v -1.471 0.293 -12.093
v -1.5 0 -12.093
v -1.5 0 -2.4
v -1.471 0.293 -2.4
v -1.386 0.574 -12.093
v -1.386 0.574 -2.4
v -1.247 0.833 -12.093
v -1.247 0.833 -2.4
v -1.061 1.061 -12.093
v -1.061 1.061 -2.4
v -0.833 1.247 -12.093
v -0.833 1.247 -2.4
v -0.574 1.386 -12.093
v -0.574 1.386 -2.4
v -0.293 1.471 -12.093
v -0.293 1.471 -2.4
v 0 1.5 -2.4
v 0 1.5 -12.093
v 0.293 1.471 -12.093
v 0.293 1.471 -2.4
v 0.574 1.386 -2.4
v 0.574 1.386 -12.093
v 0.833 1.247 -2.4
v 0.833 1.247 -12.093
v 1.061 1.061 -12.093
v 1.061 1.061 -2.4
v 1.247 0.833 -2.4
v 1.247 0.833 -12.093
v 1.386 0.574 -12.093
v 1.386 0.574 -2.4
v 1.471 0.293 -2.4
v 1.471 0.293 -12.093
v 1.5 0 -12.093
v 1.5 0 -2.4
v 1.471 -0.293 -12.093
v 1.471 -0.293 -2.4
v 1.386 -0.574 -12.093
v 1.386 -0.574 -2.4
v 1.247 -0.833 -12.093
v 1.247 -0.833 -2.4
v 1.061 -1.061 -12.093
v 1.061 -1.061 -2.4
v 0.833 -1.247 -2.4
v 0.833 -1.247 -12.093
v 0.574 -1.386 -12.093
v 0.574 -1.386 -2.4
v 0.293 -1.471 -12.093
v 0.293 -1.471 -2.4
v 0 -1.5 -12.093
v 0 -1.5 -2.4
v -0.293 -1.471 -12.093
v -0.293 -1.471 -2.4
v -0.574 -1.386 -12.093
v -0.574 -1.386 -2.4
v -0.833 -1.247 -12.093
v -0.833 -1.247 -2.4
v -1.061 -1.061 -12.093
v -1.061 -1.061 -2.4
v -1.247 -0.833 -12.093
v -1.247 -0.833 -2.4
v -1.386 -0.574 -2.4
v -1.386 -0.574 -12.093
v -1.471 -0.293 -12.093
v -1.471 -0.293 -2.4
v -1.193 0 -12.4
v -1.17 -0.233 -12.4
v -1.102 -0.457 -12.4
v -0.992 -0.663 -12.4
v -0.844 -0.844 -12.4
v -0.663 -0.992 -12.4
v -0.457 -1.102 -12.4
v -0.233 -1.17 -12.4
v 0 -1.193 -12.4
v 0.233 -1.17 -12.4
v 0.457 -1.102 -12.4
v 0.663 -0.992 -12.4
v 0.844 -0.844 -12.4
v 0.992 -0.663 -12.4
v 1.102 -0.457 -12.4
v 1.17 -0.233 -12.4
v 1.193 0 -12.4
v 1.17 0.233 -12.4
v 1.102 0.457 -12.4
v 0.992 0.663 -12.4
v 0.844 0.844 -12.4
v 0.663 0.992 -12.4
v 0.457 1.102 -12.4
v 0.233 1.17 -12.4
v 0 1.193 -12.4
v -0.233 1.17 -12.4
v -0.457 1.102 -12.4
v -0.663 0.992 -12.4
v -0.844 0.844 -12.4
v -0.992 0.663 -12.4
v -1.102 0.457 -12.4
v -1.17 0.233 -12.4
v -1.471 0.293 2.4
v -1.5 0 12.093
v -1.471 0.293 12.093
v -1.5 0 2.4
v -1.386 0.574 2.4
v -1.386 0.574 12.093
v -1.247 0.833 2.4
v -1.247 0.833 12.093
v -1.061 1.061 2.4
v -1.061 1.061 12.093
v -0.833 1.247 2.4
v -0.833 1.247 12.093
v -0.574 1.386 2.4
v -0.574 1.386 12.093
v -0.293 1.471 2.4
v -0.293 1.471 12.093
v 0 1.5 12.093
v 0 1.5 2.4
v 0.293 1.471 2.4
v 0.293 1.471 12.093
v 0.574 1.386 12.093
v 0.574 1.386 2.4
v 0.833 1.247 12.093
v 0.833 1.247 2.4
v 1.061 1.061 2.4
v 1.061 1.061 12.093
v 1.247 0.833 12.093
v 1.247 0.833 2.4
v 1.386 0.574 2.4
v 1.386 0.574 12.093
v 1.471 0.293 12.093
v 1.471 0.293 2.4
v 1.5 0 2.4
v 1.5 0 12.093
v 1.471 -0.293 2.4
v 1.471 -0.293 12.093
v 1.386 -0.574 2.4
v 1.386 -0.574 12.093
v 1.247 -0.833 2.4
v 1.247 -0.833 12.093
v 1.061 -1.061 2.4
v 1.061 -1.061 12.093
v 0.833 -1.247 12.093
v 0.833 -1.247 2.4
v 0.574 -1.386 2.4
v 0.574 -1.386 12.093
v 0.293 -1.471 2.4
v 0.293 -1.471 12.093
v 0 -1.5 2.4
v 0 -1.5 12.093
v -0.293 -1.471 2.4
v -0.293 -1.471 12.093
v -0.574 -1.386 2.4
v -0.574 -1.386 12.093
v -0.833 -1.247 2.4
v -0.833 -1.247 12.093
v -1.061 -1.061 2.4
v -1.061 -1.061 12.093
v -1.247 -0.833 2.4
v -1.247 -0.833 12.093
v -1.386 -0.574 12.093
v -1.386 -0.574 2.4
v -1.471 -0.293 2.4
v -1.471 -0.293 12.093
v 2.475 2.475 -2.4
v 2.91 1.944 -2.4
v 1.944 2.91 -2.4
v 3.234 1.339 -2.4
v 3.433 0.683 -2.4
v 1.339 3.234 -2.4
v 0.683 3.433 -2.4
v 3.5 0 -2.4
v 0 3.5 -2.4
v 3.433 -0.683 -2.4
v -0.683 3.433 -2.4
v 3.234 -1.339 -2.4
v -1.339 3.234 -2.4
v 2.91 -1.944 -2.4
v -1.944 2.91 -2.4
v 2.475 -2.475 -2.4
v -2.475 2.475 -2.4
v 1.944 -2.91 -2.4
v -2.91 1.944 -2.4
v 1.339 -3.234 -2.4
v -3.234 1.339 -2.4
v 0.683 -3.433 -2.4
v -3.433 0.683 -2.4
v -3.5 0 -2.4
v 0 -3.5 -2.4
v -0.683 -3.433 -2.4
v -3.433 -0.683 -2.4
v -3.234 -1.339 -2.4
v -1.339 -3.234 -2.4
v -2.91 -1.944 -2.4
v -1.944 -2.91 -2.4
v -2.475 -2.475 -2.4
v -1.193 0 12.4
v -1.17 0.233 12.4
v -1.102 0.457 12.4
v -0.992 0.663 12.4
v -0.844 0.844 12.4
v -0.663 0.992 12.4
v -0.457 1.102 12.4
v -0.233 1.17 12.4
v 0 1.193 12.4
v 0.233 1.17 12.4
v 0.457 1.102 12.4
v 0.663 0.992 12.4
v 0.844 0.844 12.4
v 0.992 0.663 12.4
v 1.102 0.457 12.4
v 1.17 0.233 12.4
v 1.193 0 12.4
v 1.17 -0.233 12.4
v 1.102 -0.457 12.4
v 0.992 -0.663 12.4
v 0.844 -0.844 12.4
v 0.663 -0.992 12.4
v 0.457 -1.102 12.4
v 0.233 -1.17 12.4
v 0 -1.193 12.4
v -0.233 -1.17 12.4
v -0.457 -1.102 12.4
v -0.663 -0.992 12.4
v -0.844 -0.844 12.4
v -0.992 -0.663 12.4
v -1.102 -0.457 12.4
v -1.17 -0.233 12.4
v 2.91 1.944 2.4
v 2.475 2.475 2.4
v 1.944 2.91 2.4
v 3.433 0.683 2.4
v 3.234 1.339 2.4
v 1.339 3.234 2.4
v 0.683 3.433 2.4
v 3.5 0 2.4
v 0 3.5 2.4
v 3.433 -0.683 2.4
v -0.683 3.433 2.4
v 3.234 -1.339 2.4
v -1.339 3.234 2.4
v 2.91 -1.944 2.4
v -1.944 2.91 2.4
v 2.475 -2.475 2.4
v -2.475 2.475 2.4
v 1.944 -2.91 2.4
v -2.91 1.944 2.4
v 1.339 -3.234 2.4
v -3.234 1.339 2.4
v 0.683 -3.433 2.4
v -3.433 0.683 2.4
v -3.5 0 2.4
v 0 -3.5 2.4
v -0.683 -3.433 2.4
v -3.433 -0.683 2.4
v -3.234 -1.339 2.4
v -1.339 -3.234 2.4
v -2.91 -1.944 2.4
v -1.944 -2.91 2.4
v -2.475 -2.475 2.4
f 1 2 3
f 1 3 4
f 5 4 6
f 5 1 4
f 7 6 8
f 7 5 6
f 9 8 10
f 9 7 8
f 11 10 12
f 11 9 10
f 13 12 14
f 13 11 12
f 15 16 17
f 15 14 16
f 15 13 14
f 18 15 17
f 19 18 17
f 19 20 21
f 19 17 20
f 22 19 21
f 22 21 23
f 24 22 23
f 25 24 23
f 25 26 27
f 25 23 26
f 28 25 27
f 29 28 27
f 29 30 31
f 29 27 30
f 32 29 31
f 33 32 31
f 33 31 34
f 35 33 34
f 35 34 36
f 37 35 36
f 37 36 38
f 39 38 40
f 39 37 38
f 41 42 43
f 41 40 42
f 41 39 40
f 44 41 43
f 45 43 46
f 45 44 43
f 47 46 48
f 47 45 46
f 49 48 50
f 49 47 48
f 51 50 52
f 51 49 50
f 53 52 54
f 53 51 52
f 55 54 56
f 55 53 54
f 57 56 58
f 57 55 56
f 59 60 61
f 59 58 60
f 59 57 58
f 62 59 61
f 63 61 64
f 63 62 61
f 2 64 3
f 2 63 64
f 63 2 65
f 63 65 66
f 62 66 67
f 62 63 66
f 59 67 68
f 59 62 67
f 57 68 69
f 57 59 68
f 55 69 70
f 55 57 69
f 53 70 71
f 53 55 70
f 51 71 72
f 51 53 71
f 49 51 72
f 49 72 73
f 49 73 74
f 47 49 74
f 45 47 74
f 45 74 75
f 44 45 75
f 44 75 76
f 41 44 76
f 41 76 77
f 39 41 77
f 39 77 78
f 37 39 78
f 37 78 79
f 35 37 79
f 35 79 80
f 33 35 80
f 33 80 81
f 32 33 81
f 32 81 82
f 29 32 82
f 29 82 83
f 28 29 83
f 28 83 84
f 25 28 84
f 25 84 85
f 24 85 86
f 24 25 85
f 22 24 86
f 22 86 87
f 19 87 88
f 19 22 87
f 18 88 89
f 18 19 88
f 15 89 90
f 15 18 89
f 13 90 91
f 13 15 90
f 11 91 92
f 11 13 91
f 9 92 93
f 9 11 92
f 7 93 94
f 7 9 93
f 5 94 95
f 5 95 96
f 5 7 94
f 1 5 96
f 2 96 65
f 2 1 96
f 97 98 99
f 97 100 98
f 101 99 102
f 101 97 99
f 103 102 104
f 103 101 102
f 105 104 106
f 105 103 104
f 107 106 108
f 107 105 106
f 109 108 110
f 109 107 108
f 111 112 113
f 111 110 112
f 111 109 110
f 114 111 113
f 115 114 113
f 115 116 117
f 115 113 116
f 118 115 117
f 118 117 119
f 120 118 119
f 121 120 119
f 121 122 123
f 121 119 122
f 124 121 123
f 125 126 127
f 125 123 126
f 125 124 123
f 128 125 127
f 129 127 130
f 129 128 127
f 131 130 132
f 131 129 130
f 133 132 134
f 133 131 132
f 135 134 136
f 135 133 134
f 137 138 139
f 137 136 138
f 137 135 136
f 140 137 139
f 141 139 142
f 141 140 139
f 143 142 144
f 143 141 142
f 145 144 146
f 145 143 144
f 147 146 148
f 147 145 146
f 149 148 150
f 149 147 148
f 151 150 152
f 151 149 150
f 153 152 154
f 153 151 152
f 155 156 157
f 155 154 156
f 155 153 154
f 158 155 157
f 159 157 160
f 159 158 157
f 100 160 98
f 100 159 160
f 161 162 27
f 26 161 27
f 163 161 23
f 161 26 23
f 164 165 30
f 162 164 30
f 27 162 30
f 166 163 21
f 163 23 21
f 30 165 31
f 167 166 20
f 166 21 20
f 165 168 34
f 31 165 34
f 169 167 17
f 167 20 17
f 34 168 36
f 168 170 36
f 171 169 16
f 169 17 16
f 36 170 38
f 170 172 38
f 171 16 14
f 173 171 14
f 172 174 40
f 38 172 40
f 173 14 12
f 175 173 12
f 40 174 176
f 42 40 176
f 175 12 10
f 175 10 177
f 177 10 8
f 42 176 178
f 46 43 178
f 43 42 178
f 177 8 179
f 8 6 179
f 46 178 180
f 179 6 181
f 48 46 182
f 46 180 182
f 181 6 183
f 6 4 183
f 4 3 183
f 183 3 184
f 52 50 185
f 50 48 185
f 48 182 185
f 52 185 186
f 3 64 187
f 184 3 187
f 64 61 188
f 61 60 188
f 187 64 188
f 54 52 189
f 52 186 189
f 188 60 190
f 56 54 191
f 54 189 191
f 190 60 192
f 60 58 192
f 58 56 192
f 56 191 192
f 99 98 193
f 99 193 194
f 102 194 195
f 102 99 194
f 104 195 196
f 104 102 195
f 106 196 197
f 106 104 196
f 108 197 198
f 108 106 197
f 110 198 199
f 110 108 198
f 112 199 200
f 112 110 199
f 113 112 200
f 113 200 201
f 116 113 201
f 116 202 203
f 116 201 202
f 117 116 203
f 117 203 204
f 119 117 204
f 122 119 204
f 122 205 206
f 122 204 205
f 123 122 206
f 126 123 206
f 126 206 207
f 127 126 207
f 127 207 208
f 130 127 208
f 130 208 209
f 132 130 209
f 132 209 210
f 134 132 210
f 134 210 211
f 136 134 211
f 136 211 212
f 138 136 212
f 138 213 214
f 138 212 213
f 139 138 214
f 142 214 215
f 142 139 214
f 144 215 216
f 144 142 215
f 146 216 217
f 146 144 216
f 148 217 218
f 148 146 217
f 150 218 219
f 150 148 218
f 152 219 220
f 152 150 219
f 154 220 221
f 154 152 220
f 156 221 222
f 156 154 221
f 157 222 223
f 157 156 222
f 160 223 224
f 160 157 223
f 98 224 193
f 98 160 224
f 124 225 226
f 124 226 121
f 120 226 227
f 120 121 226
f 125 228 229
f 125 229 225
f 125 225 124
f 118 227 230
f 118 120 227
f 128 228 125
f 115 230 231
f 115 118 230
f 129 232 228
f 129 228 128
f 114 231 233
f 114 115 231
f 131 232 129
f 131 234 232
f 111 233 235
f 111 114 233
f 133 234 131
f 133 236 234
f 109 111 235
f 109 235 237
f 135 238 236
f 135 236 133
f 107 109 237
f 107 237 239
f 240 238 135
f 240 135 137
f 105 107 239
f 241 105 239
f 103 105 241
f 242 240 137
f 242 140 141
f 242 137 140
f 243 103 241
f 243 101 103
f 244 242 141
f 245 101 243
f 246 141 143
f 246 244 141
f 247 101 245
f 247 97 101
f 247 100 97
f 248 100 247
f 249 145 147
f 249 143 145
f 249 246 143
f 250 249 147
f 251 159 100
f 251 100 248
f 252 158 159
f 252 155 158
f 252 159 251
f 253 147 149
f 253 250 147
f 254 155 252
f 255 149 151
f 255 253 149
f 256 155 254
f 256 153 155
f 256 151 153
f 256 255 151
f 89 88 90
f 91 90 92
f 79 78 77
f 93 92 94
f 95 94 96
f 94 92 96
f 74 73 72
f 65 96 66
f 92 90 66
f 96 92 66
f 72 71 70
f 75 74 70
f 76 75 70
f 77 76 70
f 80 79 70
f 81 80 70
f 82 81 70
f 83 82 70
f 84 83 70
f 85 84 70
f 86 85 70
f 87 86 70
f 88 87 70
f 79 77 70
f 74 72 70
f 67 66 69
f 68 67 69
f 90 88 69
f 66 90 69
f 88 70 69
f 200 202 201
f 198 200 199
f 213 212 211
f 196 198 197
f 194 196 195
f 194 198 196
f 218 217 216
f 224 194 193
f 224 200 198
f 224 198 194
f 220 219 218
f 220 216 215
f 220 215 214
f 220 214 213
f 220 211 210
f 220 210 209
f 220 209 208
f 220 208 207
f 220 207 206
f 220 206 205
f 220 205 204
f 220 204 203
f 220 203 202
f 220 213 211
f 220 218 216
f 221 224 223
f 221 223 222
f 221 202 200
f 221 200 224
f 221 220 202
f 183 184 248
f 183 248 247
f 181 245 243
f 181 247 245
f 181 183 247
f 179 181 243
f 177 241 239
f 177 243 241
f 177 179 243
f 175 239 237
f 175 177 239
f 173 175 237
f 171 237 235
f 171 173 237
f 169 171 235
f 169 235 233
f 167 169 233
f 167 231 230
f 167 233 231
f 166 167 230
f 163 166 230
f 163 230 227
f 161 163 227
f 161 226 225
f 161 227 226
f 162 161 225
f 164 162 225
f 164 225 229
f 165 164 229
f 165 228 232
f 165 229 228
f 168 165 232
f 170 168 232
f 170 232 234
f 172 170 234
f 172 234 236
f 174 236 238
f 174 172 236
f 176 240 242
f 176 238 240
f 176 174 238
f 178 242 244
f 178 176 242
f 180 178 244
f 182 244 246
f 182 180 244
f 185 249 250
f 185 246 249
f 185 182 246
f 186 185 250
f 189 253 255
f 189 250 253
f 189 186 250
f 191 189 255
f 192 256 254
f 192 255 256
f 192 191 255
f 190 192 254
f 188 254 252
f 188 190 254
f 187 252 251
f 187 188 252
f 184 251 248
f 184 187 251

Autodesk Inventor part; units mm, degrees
ref_plane "YZ Plane" through (0, 0, 0) normal (1, 0, 0) x (0, 1, 0)
ref_plane "XZ Plane" through (0, 0, 0) normal (0, 1, 0) x (-1, 0, 0)
ref_plane "XY Plane" through (0, 0, 0) normal (0, 0, 1) x (1, 0, 0)
sketch "Boceto1" plane through (0, 0, 0) normal (0, 1, 0) x (-1, 0, 0)
  line L0 (0, 12.4) -> (1.5, 12.4)
  line L1 (1.5, 12.4) -> (1.5, 2.4)
  line L2 (1.5, 2.4) -> (3.5, 2.4)
  line L3 (3.5, 2.4) -> (3.5, -2.4)
  line L4 (3.5, -2.4) -> (1.5, -2.4)
  line L5 (1.5, -2.4) -> (1.5, -12.4)
  line L6 (1.5, -12.4) -> (0, -12.4)
  line L7 (0, -12.4) -> (0, 12.4)
  point P0 (0, 0)
  point P1 (0, 0)
  dimension "d0" = 7
  dimension "d1" = 3
  dimension "Dedos" = 4.8
  dimension "R" = 10
revolve "Revolución1" add sketch "Boceto1" angle 360 about axis through (0, 0, -12.4) along (0, 0, 1)
thread "Rosca2" size "M3x0.5" class "6g" standard "ANSI Metric M Profile" length 4
thread "Rosca3" size "M3x0.5" class "6g" standard "ANSI Metric M Profile" length 4 offset 6
chamfer "Chaflán1" distance 0.3067 angle 45 2 edges at (1.5, 0, 12.4) (1.5, 0, -12.4)
properties part number "Clavija" material "Aluminum 7075"
